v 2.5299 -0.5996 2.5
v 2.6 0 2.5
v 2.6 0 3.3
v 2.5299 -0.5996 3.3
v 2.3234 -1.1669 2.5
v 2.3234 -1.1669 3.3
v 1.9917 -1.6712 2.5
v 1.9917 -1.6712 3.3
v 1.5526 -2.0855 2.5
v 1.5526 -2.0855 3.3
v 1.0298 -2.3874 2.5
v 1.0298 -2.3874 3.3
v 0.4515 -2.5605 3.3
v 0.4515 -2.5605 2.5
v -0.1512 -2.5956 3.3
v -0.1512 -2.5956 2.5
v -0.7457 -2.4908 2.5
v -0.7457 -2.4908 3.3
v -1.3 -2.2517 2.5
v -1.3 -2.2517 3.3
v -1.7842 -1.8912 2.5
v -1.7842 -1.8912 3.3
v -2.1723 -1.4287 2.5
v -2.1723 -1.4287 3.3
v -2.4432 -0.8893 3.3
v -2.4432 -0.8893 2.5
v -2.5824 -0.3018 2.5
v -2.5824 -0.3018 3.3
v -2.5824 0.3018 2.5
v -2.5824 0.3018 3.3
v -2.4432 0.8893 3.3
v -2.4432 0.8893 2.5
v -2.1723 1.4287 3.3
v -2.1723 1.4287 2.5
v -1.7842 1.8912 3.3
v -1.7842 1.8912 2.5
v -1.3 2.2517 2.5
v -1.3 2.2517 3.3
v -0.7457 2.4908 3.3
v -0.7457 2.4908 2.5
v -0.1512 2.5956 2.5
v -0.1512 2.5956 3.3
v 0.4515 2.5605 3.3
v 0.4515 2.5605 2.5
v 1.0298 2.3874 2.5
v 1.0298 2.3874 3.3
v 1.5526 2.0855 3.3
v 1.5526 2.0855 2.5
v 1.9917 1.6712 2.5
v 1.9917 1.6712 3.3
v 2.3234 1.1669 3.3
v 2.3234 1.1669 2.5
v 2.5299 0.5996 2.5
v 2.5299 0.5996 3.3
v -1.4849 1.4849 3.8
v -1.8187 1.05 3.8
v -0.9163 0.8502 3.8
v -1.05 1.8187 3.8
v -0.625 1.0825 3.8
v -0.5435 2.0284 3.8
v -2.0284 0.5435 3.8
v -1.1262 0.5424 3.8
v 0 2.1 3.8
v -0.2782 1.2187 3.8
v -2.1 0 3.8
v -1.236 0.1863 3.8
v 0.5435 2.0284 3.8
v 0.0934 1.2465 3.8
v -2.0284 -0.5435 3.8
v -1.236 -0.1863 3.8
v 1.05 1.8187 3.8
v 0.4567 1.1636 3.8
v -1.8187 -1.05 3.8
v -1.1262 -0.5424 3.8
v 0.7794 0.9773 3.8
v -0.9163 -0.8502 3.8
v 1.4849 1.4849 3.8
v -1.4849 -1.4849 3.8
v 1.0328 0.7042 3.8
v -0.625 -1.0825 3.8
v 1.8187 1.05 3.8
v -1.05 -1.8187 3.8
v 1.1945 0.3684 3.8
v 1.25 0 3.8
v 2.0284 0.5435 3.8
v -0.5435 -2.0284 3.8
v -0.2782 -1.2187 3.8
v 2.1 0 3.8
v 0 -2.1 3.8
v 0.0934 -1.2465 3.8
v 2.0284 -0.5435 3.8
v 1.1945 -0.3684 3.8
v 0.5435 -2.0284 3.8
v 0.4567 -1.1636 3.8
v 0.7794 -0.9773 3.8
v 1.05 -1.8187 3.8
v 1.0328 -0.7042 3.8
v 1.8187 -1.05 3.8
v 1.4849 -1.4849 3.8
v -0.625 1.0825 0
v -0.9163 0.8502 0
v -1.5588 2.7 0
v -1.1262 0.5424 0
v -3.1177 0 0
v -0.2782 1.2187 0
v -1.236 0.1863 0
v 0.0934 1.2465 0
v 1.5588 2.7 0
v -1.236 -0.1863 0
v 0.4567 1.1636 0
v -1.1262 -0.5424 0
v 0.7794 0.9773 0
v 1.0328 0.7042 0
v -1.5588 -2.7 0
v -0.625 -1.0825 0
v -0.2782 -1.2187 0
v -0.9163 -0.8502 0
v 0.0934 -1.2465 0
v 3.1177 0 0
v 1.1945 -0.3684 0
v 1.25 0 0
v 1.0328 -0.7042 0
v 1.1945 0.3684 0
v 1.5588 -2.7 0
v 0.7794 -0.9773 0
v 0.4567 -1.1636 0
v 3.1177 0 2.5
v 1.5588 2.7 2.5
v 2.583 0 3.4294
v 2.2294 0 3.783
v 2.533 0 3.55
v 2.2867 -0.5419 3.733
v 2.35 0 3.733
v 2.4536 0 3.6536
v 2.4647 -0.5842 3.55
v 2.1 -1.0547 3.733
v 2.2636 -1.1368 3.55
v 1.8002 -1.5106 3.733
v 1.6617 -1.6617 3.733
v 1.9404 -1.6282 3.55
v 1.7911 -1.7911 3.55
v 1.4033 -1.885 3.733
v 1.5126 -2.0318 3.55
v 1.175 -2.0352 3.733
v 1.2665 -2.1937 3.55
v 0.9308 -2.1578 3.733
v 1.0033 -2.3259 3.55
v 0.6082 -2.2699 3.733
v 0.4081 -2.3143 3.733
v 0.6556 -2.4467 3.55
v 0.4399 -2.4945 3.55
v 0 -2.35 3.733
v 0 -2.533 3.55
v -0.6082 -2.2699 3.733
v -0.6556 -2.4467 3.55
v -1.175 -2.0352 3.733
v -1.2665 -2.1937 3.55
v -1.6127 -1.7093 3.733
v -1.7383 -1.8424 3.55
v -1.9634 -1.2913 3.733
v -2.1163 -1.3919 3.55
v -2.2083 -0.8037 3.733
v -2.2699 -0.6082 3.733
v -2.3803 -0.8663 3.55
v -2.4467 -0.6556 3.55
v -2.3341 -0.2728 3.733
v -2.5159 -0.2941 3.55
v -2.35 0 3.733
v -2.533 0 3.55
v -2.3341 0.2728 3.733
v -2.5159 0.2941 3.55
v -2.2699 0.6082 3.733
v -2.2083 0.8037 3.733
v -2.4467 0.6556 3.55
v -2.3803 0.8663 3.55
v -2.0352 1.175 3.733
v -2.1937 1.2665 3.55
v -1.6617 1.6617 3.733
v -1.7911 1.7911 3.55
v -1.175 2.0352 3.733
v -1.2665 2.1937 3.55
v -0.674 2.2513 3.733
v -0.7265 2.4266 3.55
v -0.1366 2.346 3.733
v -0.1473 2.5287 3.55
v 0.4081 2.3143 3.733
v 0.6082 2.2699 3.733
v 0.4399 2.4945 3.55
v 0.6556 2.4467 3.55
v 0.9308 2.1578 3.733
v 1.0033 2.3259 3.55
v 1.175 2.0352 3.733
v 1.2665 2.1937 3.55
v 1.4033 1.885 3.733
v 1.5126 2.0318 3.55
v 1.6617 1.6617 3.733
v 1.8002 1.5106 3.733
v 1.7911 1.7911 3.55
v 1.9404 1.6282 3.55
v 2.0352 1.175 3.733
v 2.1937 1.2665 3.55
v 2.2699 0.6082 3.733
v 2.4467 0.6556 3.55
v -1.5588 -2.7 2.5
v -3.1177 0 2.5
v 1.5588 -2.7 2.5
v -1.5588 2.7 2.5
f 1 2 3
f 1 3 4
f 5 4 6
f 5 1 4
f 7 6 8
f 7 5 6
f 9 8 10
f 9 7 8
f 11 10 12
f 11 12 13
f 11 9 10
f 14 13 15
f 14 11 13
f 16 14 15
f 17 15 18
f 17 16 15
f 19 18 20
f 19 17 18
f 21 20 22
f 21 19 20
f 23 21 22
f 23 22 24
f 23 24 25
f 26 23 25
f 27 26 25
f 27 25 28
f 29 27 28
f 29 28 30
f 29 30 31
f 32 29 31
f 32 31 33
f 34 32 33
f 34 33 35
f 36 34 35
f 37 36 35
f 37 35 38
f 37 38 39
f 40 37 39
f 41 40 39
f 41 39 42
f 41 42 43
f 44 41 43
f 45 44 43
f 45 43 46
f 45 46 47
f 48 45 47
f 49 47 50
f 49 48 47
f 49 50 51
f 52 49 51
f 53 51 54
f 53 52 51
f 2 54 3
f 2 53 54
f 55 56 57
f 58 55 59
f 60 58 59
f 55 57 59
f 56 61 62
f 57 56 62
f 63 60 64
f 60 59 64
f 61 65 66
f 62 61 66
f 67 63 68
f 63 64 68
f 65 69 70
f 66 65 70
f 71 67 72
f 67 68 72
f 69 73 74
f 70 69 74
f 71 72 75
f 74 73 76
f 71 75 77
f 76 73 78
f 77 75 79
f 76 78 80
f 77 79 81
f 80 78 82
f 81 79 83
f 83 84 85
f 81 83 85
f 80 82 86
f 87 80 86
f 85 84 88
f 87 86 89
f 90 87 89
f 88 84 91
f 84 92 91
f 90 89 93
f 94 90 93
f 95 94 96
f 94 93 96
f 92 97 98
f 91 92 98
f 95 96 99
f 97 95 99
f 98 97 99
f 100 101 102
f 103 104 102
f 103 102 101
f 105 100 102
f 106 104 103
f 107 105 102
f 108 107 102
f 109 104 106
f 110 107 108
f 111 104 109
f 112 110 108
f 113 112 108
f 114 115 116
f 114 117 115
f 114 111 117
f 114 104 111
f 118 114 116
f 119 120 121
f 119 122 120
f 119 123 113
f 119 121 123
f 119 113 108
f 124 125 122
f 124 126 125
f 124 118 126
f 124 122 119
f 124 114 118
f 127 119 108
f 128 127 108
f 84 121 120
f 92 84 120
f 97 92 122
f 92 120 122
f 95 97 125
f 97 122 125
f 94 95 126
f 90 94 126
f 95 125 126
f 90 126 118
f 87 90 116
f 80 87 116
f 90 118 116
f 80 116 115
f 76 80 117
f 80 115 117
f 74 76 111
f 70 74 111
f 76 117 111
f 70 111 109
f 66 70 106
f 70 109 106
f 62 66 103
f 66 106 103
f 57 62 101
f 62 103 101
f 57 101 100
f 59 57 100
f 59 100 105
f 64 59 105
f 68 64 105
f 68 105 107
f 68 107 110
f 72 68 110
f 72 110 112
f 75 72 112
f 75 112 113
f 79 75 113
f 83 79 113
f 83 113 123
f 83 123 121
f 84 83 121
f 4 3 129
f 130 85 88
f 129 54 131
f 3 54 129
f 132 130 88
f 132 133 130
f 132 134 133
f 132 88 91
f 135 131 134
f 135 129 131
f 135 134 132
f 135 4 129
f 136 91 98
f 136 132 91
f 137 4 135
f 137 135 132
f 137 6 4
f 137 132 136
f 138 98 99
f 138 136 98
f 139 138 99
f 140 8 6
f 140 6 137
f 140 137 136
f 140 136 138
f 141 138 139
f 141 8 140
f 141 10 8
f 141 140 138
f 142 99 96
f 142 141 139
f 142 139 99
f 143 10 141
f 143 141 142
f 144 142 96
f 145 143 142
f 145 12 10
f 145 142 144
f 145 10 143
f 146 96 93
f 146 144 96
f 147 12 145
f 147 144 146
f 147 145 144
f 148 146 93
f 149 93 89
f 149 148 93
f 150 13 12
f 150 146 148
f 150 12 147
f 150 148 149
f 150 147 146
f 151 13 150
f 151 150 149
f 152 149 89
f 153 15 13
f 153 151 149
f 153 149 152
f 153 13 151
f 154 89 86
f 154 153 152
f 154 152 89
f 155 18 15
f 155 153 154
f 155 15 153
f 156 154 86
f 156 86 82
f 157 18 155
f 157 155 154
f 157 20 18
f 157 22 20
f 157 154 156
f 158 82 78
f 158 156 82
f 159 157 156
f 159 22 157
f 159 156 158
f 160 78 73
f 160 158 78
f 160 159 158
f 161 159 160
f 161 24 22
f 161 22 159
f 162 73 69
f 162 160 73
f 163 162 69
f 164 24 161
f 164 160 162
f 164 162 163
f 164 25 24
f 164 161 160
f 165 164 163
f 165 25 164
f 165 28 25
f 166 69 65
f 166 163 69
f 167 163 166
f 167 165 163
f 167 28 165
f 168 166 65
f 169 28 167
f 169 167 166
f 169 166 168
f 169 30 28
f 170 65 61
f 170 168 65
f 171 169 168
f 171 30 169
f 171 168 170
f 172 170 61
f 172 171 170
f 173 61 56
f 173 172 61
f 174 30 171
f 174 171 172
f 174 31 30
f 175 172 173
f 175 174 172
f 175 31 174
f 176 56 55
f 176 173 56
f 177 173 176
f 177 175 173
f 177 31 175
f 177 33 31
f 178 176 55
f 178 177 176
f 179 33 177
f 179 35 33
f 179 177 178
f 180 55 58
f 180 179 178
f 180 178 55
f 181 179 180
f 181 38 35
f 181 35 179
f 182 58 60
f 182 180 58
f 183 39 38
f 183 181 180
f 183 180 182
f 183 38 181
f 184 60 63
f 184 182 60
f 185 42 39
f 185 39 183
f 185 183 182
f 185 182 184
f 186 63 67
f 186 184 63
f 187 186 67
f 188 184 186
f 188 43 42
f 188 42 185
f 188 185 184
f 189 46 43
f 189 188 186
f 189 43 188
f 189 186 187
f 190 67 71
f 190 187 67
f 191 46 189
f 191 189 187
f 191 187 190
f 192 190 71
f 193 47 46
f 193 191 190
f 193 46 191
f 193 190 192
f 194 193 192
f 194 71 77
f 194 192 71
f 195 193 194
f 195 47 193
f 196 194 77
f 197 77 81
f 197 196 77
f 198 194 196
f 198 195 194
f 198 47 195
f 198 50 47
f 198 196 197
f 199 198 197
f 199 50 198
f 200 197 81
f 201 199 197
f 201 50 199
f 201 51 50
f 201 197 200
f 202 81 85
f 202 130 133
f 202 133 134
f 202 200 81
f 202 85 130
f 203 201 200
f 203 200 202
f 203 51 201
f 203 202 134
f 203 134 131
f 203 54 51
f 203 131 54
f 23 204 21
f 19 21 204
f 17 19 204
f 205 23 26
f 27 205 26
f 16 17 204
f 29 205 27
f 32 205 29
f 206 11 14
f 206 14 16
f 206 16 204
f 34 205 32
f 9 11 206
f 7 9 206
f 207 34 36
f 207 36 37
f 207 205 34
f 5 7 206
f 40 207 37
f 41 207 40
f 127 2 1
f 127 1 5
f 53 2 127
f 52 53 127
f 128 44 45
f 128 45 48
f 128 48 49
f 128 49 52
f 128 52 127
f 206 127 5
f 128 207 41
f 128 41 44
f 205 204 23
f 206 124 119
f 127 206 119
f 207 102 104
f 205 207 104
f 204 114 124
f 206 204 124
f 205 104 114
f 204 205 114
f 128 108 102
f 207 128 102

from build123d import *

# Parameters (mm, degrees)
F1_DEPTH = 2.5
F2_R     = 2.6
F2_R_2   = 1.25
F3_DEPTH = 3.8
F4_DEPTH = 25
F5_R     = 0.5


with BuildPart() as f1:
    # F0 (on Top) → F1 (new body)
    with BuildSketch(Plane.XY):
        Polygon((-1.558846, -2.7), (1.558846, -2.7), (3.117691, 0), (1.558846, 2.7), (-1.558846, 2.7), (-3.117691, 0), align=None)
    extrude(amount=F1_DEPTH)

    # F2 (on face) → F3 (join)
    with BuildSketch(Plane(origin=(0, 0, 0), x_dir=(1, 0, 0), z_dir=(0, 0, -1))):
        Circle(F2_R)
        Circle(F2_R_2, mode=Mode.SUBTRACT)
    extrude(amount=-F3_DEPTH)

    # F2 (on face) → F4 (cut)
    with BuildSketch(Plane(origin=(0, 0, 0), x_dir=(1, 0, 0), z_dir=(0, 0, -1))):
        Circle(F2_R_2)
    extrude(amount=-F4_DEPTH, mode=Mode.SUBTRACT)

    # F5
    f5_edges = [f1.edges().sort_by_distance(p)[0] for p in [
        (-2.6, 0, 3.8),
    ]]
    fillet(f5_edges, radius=F5_R)


solid = f1.part
